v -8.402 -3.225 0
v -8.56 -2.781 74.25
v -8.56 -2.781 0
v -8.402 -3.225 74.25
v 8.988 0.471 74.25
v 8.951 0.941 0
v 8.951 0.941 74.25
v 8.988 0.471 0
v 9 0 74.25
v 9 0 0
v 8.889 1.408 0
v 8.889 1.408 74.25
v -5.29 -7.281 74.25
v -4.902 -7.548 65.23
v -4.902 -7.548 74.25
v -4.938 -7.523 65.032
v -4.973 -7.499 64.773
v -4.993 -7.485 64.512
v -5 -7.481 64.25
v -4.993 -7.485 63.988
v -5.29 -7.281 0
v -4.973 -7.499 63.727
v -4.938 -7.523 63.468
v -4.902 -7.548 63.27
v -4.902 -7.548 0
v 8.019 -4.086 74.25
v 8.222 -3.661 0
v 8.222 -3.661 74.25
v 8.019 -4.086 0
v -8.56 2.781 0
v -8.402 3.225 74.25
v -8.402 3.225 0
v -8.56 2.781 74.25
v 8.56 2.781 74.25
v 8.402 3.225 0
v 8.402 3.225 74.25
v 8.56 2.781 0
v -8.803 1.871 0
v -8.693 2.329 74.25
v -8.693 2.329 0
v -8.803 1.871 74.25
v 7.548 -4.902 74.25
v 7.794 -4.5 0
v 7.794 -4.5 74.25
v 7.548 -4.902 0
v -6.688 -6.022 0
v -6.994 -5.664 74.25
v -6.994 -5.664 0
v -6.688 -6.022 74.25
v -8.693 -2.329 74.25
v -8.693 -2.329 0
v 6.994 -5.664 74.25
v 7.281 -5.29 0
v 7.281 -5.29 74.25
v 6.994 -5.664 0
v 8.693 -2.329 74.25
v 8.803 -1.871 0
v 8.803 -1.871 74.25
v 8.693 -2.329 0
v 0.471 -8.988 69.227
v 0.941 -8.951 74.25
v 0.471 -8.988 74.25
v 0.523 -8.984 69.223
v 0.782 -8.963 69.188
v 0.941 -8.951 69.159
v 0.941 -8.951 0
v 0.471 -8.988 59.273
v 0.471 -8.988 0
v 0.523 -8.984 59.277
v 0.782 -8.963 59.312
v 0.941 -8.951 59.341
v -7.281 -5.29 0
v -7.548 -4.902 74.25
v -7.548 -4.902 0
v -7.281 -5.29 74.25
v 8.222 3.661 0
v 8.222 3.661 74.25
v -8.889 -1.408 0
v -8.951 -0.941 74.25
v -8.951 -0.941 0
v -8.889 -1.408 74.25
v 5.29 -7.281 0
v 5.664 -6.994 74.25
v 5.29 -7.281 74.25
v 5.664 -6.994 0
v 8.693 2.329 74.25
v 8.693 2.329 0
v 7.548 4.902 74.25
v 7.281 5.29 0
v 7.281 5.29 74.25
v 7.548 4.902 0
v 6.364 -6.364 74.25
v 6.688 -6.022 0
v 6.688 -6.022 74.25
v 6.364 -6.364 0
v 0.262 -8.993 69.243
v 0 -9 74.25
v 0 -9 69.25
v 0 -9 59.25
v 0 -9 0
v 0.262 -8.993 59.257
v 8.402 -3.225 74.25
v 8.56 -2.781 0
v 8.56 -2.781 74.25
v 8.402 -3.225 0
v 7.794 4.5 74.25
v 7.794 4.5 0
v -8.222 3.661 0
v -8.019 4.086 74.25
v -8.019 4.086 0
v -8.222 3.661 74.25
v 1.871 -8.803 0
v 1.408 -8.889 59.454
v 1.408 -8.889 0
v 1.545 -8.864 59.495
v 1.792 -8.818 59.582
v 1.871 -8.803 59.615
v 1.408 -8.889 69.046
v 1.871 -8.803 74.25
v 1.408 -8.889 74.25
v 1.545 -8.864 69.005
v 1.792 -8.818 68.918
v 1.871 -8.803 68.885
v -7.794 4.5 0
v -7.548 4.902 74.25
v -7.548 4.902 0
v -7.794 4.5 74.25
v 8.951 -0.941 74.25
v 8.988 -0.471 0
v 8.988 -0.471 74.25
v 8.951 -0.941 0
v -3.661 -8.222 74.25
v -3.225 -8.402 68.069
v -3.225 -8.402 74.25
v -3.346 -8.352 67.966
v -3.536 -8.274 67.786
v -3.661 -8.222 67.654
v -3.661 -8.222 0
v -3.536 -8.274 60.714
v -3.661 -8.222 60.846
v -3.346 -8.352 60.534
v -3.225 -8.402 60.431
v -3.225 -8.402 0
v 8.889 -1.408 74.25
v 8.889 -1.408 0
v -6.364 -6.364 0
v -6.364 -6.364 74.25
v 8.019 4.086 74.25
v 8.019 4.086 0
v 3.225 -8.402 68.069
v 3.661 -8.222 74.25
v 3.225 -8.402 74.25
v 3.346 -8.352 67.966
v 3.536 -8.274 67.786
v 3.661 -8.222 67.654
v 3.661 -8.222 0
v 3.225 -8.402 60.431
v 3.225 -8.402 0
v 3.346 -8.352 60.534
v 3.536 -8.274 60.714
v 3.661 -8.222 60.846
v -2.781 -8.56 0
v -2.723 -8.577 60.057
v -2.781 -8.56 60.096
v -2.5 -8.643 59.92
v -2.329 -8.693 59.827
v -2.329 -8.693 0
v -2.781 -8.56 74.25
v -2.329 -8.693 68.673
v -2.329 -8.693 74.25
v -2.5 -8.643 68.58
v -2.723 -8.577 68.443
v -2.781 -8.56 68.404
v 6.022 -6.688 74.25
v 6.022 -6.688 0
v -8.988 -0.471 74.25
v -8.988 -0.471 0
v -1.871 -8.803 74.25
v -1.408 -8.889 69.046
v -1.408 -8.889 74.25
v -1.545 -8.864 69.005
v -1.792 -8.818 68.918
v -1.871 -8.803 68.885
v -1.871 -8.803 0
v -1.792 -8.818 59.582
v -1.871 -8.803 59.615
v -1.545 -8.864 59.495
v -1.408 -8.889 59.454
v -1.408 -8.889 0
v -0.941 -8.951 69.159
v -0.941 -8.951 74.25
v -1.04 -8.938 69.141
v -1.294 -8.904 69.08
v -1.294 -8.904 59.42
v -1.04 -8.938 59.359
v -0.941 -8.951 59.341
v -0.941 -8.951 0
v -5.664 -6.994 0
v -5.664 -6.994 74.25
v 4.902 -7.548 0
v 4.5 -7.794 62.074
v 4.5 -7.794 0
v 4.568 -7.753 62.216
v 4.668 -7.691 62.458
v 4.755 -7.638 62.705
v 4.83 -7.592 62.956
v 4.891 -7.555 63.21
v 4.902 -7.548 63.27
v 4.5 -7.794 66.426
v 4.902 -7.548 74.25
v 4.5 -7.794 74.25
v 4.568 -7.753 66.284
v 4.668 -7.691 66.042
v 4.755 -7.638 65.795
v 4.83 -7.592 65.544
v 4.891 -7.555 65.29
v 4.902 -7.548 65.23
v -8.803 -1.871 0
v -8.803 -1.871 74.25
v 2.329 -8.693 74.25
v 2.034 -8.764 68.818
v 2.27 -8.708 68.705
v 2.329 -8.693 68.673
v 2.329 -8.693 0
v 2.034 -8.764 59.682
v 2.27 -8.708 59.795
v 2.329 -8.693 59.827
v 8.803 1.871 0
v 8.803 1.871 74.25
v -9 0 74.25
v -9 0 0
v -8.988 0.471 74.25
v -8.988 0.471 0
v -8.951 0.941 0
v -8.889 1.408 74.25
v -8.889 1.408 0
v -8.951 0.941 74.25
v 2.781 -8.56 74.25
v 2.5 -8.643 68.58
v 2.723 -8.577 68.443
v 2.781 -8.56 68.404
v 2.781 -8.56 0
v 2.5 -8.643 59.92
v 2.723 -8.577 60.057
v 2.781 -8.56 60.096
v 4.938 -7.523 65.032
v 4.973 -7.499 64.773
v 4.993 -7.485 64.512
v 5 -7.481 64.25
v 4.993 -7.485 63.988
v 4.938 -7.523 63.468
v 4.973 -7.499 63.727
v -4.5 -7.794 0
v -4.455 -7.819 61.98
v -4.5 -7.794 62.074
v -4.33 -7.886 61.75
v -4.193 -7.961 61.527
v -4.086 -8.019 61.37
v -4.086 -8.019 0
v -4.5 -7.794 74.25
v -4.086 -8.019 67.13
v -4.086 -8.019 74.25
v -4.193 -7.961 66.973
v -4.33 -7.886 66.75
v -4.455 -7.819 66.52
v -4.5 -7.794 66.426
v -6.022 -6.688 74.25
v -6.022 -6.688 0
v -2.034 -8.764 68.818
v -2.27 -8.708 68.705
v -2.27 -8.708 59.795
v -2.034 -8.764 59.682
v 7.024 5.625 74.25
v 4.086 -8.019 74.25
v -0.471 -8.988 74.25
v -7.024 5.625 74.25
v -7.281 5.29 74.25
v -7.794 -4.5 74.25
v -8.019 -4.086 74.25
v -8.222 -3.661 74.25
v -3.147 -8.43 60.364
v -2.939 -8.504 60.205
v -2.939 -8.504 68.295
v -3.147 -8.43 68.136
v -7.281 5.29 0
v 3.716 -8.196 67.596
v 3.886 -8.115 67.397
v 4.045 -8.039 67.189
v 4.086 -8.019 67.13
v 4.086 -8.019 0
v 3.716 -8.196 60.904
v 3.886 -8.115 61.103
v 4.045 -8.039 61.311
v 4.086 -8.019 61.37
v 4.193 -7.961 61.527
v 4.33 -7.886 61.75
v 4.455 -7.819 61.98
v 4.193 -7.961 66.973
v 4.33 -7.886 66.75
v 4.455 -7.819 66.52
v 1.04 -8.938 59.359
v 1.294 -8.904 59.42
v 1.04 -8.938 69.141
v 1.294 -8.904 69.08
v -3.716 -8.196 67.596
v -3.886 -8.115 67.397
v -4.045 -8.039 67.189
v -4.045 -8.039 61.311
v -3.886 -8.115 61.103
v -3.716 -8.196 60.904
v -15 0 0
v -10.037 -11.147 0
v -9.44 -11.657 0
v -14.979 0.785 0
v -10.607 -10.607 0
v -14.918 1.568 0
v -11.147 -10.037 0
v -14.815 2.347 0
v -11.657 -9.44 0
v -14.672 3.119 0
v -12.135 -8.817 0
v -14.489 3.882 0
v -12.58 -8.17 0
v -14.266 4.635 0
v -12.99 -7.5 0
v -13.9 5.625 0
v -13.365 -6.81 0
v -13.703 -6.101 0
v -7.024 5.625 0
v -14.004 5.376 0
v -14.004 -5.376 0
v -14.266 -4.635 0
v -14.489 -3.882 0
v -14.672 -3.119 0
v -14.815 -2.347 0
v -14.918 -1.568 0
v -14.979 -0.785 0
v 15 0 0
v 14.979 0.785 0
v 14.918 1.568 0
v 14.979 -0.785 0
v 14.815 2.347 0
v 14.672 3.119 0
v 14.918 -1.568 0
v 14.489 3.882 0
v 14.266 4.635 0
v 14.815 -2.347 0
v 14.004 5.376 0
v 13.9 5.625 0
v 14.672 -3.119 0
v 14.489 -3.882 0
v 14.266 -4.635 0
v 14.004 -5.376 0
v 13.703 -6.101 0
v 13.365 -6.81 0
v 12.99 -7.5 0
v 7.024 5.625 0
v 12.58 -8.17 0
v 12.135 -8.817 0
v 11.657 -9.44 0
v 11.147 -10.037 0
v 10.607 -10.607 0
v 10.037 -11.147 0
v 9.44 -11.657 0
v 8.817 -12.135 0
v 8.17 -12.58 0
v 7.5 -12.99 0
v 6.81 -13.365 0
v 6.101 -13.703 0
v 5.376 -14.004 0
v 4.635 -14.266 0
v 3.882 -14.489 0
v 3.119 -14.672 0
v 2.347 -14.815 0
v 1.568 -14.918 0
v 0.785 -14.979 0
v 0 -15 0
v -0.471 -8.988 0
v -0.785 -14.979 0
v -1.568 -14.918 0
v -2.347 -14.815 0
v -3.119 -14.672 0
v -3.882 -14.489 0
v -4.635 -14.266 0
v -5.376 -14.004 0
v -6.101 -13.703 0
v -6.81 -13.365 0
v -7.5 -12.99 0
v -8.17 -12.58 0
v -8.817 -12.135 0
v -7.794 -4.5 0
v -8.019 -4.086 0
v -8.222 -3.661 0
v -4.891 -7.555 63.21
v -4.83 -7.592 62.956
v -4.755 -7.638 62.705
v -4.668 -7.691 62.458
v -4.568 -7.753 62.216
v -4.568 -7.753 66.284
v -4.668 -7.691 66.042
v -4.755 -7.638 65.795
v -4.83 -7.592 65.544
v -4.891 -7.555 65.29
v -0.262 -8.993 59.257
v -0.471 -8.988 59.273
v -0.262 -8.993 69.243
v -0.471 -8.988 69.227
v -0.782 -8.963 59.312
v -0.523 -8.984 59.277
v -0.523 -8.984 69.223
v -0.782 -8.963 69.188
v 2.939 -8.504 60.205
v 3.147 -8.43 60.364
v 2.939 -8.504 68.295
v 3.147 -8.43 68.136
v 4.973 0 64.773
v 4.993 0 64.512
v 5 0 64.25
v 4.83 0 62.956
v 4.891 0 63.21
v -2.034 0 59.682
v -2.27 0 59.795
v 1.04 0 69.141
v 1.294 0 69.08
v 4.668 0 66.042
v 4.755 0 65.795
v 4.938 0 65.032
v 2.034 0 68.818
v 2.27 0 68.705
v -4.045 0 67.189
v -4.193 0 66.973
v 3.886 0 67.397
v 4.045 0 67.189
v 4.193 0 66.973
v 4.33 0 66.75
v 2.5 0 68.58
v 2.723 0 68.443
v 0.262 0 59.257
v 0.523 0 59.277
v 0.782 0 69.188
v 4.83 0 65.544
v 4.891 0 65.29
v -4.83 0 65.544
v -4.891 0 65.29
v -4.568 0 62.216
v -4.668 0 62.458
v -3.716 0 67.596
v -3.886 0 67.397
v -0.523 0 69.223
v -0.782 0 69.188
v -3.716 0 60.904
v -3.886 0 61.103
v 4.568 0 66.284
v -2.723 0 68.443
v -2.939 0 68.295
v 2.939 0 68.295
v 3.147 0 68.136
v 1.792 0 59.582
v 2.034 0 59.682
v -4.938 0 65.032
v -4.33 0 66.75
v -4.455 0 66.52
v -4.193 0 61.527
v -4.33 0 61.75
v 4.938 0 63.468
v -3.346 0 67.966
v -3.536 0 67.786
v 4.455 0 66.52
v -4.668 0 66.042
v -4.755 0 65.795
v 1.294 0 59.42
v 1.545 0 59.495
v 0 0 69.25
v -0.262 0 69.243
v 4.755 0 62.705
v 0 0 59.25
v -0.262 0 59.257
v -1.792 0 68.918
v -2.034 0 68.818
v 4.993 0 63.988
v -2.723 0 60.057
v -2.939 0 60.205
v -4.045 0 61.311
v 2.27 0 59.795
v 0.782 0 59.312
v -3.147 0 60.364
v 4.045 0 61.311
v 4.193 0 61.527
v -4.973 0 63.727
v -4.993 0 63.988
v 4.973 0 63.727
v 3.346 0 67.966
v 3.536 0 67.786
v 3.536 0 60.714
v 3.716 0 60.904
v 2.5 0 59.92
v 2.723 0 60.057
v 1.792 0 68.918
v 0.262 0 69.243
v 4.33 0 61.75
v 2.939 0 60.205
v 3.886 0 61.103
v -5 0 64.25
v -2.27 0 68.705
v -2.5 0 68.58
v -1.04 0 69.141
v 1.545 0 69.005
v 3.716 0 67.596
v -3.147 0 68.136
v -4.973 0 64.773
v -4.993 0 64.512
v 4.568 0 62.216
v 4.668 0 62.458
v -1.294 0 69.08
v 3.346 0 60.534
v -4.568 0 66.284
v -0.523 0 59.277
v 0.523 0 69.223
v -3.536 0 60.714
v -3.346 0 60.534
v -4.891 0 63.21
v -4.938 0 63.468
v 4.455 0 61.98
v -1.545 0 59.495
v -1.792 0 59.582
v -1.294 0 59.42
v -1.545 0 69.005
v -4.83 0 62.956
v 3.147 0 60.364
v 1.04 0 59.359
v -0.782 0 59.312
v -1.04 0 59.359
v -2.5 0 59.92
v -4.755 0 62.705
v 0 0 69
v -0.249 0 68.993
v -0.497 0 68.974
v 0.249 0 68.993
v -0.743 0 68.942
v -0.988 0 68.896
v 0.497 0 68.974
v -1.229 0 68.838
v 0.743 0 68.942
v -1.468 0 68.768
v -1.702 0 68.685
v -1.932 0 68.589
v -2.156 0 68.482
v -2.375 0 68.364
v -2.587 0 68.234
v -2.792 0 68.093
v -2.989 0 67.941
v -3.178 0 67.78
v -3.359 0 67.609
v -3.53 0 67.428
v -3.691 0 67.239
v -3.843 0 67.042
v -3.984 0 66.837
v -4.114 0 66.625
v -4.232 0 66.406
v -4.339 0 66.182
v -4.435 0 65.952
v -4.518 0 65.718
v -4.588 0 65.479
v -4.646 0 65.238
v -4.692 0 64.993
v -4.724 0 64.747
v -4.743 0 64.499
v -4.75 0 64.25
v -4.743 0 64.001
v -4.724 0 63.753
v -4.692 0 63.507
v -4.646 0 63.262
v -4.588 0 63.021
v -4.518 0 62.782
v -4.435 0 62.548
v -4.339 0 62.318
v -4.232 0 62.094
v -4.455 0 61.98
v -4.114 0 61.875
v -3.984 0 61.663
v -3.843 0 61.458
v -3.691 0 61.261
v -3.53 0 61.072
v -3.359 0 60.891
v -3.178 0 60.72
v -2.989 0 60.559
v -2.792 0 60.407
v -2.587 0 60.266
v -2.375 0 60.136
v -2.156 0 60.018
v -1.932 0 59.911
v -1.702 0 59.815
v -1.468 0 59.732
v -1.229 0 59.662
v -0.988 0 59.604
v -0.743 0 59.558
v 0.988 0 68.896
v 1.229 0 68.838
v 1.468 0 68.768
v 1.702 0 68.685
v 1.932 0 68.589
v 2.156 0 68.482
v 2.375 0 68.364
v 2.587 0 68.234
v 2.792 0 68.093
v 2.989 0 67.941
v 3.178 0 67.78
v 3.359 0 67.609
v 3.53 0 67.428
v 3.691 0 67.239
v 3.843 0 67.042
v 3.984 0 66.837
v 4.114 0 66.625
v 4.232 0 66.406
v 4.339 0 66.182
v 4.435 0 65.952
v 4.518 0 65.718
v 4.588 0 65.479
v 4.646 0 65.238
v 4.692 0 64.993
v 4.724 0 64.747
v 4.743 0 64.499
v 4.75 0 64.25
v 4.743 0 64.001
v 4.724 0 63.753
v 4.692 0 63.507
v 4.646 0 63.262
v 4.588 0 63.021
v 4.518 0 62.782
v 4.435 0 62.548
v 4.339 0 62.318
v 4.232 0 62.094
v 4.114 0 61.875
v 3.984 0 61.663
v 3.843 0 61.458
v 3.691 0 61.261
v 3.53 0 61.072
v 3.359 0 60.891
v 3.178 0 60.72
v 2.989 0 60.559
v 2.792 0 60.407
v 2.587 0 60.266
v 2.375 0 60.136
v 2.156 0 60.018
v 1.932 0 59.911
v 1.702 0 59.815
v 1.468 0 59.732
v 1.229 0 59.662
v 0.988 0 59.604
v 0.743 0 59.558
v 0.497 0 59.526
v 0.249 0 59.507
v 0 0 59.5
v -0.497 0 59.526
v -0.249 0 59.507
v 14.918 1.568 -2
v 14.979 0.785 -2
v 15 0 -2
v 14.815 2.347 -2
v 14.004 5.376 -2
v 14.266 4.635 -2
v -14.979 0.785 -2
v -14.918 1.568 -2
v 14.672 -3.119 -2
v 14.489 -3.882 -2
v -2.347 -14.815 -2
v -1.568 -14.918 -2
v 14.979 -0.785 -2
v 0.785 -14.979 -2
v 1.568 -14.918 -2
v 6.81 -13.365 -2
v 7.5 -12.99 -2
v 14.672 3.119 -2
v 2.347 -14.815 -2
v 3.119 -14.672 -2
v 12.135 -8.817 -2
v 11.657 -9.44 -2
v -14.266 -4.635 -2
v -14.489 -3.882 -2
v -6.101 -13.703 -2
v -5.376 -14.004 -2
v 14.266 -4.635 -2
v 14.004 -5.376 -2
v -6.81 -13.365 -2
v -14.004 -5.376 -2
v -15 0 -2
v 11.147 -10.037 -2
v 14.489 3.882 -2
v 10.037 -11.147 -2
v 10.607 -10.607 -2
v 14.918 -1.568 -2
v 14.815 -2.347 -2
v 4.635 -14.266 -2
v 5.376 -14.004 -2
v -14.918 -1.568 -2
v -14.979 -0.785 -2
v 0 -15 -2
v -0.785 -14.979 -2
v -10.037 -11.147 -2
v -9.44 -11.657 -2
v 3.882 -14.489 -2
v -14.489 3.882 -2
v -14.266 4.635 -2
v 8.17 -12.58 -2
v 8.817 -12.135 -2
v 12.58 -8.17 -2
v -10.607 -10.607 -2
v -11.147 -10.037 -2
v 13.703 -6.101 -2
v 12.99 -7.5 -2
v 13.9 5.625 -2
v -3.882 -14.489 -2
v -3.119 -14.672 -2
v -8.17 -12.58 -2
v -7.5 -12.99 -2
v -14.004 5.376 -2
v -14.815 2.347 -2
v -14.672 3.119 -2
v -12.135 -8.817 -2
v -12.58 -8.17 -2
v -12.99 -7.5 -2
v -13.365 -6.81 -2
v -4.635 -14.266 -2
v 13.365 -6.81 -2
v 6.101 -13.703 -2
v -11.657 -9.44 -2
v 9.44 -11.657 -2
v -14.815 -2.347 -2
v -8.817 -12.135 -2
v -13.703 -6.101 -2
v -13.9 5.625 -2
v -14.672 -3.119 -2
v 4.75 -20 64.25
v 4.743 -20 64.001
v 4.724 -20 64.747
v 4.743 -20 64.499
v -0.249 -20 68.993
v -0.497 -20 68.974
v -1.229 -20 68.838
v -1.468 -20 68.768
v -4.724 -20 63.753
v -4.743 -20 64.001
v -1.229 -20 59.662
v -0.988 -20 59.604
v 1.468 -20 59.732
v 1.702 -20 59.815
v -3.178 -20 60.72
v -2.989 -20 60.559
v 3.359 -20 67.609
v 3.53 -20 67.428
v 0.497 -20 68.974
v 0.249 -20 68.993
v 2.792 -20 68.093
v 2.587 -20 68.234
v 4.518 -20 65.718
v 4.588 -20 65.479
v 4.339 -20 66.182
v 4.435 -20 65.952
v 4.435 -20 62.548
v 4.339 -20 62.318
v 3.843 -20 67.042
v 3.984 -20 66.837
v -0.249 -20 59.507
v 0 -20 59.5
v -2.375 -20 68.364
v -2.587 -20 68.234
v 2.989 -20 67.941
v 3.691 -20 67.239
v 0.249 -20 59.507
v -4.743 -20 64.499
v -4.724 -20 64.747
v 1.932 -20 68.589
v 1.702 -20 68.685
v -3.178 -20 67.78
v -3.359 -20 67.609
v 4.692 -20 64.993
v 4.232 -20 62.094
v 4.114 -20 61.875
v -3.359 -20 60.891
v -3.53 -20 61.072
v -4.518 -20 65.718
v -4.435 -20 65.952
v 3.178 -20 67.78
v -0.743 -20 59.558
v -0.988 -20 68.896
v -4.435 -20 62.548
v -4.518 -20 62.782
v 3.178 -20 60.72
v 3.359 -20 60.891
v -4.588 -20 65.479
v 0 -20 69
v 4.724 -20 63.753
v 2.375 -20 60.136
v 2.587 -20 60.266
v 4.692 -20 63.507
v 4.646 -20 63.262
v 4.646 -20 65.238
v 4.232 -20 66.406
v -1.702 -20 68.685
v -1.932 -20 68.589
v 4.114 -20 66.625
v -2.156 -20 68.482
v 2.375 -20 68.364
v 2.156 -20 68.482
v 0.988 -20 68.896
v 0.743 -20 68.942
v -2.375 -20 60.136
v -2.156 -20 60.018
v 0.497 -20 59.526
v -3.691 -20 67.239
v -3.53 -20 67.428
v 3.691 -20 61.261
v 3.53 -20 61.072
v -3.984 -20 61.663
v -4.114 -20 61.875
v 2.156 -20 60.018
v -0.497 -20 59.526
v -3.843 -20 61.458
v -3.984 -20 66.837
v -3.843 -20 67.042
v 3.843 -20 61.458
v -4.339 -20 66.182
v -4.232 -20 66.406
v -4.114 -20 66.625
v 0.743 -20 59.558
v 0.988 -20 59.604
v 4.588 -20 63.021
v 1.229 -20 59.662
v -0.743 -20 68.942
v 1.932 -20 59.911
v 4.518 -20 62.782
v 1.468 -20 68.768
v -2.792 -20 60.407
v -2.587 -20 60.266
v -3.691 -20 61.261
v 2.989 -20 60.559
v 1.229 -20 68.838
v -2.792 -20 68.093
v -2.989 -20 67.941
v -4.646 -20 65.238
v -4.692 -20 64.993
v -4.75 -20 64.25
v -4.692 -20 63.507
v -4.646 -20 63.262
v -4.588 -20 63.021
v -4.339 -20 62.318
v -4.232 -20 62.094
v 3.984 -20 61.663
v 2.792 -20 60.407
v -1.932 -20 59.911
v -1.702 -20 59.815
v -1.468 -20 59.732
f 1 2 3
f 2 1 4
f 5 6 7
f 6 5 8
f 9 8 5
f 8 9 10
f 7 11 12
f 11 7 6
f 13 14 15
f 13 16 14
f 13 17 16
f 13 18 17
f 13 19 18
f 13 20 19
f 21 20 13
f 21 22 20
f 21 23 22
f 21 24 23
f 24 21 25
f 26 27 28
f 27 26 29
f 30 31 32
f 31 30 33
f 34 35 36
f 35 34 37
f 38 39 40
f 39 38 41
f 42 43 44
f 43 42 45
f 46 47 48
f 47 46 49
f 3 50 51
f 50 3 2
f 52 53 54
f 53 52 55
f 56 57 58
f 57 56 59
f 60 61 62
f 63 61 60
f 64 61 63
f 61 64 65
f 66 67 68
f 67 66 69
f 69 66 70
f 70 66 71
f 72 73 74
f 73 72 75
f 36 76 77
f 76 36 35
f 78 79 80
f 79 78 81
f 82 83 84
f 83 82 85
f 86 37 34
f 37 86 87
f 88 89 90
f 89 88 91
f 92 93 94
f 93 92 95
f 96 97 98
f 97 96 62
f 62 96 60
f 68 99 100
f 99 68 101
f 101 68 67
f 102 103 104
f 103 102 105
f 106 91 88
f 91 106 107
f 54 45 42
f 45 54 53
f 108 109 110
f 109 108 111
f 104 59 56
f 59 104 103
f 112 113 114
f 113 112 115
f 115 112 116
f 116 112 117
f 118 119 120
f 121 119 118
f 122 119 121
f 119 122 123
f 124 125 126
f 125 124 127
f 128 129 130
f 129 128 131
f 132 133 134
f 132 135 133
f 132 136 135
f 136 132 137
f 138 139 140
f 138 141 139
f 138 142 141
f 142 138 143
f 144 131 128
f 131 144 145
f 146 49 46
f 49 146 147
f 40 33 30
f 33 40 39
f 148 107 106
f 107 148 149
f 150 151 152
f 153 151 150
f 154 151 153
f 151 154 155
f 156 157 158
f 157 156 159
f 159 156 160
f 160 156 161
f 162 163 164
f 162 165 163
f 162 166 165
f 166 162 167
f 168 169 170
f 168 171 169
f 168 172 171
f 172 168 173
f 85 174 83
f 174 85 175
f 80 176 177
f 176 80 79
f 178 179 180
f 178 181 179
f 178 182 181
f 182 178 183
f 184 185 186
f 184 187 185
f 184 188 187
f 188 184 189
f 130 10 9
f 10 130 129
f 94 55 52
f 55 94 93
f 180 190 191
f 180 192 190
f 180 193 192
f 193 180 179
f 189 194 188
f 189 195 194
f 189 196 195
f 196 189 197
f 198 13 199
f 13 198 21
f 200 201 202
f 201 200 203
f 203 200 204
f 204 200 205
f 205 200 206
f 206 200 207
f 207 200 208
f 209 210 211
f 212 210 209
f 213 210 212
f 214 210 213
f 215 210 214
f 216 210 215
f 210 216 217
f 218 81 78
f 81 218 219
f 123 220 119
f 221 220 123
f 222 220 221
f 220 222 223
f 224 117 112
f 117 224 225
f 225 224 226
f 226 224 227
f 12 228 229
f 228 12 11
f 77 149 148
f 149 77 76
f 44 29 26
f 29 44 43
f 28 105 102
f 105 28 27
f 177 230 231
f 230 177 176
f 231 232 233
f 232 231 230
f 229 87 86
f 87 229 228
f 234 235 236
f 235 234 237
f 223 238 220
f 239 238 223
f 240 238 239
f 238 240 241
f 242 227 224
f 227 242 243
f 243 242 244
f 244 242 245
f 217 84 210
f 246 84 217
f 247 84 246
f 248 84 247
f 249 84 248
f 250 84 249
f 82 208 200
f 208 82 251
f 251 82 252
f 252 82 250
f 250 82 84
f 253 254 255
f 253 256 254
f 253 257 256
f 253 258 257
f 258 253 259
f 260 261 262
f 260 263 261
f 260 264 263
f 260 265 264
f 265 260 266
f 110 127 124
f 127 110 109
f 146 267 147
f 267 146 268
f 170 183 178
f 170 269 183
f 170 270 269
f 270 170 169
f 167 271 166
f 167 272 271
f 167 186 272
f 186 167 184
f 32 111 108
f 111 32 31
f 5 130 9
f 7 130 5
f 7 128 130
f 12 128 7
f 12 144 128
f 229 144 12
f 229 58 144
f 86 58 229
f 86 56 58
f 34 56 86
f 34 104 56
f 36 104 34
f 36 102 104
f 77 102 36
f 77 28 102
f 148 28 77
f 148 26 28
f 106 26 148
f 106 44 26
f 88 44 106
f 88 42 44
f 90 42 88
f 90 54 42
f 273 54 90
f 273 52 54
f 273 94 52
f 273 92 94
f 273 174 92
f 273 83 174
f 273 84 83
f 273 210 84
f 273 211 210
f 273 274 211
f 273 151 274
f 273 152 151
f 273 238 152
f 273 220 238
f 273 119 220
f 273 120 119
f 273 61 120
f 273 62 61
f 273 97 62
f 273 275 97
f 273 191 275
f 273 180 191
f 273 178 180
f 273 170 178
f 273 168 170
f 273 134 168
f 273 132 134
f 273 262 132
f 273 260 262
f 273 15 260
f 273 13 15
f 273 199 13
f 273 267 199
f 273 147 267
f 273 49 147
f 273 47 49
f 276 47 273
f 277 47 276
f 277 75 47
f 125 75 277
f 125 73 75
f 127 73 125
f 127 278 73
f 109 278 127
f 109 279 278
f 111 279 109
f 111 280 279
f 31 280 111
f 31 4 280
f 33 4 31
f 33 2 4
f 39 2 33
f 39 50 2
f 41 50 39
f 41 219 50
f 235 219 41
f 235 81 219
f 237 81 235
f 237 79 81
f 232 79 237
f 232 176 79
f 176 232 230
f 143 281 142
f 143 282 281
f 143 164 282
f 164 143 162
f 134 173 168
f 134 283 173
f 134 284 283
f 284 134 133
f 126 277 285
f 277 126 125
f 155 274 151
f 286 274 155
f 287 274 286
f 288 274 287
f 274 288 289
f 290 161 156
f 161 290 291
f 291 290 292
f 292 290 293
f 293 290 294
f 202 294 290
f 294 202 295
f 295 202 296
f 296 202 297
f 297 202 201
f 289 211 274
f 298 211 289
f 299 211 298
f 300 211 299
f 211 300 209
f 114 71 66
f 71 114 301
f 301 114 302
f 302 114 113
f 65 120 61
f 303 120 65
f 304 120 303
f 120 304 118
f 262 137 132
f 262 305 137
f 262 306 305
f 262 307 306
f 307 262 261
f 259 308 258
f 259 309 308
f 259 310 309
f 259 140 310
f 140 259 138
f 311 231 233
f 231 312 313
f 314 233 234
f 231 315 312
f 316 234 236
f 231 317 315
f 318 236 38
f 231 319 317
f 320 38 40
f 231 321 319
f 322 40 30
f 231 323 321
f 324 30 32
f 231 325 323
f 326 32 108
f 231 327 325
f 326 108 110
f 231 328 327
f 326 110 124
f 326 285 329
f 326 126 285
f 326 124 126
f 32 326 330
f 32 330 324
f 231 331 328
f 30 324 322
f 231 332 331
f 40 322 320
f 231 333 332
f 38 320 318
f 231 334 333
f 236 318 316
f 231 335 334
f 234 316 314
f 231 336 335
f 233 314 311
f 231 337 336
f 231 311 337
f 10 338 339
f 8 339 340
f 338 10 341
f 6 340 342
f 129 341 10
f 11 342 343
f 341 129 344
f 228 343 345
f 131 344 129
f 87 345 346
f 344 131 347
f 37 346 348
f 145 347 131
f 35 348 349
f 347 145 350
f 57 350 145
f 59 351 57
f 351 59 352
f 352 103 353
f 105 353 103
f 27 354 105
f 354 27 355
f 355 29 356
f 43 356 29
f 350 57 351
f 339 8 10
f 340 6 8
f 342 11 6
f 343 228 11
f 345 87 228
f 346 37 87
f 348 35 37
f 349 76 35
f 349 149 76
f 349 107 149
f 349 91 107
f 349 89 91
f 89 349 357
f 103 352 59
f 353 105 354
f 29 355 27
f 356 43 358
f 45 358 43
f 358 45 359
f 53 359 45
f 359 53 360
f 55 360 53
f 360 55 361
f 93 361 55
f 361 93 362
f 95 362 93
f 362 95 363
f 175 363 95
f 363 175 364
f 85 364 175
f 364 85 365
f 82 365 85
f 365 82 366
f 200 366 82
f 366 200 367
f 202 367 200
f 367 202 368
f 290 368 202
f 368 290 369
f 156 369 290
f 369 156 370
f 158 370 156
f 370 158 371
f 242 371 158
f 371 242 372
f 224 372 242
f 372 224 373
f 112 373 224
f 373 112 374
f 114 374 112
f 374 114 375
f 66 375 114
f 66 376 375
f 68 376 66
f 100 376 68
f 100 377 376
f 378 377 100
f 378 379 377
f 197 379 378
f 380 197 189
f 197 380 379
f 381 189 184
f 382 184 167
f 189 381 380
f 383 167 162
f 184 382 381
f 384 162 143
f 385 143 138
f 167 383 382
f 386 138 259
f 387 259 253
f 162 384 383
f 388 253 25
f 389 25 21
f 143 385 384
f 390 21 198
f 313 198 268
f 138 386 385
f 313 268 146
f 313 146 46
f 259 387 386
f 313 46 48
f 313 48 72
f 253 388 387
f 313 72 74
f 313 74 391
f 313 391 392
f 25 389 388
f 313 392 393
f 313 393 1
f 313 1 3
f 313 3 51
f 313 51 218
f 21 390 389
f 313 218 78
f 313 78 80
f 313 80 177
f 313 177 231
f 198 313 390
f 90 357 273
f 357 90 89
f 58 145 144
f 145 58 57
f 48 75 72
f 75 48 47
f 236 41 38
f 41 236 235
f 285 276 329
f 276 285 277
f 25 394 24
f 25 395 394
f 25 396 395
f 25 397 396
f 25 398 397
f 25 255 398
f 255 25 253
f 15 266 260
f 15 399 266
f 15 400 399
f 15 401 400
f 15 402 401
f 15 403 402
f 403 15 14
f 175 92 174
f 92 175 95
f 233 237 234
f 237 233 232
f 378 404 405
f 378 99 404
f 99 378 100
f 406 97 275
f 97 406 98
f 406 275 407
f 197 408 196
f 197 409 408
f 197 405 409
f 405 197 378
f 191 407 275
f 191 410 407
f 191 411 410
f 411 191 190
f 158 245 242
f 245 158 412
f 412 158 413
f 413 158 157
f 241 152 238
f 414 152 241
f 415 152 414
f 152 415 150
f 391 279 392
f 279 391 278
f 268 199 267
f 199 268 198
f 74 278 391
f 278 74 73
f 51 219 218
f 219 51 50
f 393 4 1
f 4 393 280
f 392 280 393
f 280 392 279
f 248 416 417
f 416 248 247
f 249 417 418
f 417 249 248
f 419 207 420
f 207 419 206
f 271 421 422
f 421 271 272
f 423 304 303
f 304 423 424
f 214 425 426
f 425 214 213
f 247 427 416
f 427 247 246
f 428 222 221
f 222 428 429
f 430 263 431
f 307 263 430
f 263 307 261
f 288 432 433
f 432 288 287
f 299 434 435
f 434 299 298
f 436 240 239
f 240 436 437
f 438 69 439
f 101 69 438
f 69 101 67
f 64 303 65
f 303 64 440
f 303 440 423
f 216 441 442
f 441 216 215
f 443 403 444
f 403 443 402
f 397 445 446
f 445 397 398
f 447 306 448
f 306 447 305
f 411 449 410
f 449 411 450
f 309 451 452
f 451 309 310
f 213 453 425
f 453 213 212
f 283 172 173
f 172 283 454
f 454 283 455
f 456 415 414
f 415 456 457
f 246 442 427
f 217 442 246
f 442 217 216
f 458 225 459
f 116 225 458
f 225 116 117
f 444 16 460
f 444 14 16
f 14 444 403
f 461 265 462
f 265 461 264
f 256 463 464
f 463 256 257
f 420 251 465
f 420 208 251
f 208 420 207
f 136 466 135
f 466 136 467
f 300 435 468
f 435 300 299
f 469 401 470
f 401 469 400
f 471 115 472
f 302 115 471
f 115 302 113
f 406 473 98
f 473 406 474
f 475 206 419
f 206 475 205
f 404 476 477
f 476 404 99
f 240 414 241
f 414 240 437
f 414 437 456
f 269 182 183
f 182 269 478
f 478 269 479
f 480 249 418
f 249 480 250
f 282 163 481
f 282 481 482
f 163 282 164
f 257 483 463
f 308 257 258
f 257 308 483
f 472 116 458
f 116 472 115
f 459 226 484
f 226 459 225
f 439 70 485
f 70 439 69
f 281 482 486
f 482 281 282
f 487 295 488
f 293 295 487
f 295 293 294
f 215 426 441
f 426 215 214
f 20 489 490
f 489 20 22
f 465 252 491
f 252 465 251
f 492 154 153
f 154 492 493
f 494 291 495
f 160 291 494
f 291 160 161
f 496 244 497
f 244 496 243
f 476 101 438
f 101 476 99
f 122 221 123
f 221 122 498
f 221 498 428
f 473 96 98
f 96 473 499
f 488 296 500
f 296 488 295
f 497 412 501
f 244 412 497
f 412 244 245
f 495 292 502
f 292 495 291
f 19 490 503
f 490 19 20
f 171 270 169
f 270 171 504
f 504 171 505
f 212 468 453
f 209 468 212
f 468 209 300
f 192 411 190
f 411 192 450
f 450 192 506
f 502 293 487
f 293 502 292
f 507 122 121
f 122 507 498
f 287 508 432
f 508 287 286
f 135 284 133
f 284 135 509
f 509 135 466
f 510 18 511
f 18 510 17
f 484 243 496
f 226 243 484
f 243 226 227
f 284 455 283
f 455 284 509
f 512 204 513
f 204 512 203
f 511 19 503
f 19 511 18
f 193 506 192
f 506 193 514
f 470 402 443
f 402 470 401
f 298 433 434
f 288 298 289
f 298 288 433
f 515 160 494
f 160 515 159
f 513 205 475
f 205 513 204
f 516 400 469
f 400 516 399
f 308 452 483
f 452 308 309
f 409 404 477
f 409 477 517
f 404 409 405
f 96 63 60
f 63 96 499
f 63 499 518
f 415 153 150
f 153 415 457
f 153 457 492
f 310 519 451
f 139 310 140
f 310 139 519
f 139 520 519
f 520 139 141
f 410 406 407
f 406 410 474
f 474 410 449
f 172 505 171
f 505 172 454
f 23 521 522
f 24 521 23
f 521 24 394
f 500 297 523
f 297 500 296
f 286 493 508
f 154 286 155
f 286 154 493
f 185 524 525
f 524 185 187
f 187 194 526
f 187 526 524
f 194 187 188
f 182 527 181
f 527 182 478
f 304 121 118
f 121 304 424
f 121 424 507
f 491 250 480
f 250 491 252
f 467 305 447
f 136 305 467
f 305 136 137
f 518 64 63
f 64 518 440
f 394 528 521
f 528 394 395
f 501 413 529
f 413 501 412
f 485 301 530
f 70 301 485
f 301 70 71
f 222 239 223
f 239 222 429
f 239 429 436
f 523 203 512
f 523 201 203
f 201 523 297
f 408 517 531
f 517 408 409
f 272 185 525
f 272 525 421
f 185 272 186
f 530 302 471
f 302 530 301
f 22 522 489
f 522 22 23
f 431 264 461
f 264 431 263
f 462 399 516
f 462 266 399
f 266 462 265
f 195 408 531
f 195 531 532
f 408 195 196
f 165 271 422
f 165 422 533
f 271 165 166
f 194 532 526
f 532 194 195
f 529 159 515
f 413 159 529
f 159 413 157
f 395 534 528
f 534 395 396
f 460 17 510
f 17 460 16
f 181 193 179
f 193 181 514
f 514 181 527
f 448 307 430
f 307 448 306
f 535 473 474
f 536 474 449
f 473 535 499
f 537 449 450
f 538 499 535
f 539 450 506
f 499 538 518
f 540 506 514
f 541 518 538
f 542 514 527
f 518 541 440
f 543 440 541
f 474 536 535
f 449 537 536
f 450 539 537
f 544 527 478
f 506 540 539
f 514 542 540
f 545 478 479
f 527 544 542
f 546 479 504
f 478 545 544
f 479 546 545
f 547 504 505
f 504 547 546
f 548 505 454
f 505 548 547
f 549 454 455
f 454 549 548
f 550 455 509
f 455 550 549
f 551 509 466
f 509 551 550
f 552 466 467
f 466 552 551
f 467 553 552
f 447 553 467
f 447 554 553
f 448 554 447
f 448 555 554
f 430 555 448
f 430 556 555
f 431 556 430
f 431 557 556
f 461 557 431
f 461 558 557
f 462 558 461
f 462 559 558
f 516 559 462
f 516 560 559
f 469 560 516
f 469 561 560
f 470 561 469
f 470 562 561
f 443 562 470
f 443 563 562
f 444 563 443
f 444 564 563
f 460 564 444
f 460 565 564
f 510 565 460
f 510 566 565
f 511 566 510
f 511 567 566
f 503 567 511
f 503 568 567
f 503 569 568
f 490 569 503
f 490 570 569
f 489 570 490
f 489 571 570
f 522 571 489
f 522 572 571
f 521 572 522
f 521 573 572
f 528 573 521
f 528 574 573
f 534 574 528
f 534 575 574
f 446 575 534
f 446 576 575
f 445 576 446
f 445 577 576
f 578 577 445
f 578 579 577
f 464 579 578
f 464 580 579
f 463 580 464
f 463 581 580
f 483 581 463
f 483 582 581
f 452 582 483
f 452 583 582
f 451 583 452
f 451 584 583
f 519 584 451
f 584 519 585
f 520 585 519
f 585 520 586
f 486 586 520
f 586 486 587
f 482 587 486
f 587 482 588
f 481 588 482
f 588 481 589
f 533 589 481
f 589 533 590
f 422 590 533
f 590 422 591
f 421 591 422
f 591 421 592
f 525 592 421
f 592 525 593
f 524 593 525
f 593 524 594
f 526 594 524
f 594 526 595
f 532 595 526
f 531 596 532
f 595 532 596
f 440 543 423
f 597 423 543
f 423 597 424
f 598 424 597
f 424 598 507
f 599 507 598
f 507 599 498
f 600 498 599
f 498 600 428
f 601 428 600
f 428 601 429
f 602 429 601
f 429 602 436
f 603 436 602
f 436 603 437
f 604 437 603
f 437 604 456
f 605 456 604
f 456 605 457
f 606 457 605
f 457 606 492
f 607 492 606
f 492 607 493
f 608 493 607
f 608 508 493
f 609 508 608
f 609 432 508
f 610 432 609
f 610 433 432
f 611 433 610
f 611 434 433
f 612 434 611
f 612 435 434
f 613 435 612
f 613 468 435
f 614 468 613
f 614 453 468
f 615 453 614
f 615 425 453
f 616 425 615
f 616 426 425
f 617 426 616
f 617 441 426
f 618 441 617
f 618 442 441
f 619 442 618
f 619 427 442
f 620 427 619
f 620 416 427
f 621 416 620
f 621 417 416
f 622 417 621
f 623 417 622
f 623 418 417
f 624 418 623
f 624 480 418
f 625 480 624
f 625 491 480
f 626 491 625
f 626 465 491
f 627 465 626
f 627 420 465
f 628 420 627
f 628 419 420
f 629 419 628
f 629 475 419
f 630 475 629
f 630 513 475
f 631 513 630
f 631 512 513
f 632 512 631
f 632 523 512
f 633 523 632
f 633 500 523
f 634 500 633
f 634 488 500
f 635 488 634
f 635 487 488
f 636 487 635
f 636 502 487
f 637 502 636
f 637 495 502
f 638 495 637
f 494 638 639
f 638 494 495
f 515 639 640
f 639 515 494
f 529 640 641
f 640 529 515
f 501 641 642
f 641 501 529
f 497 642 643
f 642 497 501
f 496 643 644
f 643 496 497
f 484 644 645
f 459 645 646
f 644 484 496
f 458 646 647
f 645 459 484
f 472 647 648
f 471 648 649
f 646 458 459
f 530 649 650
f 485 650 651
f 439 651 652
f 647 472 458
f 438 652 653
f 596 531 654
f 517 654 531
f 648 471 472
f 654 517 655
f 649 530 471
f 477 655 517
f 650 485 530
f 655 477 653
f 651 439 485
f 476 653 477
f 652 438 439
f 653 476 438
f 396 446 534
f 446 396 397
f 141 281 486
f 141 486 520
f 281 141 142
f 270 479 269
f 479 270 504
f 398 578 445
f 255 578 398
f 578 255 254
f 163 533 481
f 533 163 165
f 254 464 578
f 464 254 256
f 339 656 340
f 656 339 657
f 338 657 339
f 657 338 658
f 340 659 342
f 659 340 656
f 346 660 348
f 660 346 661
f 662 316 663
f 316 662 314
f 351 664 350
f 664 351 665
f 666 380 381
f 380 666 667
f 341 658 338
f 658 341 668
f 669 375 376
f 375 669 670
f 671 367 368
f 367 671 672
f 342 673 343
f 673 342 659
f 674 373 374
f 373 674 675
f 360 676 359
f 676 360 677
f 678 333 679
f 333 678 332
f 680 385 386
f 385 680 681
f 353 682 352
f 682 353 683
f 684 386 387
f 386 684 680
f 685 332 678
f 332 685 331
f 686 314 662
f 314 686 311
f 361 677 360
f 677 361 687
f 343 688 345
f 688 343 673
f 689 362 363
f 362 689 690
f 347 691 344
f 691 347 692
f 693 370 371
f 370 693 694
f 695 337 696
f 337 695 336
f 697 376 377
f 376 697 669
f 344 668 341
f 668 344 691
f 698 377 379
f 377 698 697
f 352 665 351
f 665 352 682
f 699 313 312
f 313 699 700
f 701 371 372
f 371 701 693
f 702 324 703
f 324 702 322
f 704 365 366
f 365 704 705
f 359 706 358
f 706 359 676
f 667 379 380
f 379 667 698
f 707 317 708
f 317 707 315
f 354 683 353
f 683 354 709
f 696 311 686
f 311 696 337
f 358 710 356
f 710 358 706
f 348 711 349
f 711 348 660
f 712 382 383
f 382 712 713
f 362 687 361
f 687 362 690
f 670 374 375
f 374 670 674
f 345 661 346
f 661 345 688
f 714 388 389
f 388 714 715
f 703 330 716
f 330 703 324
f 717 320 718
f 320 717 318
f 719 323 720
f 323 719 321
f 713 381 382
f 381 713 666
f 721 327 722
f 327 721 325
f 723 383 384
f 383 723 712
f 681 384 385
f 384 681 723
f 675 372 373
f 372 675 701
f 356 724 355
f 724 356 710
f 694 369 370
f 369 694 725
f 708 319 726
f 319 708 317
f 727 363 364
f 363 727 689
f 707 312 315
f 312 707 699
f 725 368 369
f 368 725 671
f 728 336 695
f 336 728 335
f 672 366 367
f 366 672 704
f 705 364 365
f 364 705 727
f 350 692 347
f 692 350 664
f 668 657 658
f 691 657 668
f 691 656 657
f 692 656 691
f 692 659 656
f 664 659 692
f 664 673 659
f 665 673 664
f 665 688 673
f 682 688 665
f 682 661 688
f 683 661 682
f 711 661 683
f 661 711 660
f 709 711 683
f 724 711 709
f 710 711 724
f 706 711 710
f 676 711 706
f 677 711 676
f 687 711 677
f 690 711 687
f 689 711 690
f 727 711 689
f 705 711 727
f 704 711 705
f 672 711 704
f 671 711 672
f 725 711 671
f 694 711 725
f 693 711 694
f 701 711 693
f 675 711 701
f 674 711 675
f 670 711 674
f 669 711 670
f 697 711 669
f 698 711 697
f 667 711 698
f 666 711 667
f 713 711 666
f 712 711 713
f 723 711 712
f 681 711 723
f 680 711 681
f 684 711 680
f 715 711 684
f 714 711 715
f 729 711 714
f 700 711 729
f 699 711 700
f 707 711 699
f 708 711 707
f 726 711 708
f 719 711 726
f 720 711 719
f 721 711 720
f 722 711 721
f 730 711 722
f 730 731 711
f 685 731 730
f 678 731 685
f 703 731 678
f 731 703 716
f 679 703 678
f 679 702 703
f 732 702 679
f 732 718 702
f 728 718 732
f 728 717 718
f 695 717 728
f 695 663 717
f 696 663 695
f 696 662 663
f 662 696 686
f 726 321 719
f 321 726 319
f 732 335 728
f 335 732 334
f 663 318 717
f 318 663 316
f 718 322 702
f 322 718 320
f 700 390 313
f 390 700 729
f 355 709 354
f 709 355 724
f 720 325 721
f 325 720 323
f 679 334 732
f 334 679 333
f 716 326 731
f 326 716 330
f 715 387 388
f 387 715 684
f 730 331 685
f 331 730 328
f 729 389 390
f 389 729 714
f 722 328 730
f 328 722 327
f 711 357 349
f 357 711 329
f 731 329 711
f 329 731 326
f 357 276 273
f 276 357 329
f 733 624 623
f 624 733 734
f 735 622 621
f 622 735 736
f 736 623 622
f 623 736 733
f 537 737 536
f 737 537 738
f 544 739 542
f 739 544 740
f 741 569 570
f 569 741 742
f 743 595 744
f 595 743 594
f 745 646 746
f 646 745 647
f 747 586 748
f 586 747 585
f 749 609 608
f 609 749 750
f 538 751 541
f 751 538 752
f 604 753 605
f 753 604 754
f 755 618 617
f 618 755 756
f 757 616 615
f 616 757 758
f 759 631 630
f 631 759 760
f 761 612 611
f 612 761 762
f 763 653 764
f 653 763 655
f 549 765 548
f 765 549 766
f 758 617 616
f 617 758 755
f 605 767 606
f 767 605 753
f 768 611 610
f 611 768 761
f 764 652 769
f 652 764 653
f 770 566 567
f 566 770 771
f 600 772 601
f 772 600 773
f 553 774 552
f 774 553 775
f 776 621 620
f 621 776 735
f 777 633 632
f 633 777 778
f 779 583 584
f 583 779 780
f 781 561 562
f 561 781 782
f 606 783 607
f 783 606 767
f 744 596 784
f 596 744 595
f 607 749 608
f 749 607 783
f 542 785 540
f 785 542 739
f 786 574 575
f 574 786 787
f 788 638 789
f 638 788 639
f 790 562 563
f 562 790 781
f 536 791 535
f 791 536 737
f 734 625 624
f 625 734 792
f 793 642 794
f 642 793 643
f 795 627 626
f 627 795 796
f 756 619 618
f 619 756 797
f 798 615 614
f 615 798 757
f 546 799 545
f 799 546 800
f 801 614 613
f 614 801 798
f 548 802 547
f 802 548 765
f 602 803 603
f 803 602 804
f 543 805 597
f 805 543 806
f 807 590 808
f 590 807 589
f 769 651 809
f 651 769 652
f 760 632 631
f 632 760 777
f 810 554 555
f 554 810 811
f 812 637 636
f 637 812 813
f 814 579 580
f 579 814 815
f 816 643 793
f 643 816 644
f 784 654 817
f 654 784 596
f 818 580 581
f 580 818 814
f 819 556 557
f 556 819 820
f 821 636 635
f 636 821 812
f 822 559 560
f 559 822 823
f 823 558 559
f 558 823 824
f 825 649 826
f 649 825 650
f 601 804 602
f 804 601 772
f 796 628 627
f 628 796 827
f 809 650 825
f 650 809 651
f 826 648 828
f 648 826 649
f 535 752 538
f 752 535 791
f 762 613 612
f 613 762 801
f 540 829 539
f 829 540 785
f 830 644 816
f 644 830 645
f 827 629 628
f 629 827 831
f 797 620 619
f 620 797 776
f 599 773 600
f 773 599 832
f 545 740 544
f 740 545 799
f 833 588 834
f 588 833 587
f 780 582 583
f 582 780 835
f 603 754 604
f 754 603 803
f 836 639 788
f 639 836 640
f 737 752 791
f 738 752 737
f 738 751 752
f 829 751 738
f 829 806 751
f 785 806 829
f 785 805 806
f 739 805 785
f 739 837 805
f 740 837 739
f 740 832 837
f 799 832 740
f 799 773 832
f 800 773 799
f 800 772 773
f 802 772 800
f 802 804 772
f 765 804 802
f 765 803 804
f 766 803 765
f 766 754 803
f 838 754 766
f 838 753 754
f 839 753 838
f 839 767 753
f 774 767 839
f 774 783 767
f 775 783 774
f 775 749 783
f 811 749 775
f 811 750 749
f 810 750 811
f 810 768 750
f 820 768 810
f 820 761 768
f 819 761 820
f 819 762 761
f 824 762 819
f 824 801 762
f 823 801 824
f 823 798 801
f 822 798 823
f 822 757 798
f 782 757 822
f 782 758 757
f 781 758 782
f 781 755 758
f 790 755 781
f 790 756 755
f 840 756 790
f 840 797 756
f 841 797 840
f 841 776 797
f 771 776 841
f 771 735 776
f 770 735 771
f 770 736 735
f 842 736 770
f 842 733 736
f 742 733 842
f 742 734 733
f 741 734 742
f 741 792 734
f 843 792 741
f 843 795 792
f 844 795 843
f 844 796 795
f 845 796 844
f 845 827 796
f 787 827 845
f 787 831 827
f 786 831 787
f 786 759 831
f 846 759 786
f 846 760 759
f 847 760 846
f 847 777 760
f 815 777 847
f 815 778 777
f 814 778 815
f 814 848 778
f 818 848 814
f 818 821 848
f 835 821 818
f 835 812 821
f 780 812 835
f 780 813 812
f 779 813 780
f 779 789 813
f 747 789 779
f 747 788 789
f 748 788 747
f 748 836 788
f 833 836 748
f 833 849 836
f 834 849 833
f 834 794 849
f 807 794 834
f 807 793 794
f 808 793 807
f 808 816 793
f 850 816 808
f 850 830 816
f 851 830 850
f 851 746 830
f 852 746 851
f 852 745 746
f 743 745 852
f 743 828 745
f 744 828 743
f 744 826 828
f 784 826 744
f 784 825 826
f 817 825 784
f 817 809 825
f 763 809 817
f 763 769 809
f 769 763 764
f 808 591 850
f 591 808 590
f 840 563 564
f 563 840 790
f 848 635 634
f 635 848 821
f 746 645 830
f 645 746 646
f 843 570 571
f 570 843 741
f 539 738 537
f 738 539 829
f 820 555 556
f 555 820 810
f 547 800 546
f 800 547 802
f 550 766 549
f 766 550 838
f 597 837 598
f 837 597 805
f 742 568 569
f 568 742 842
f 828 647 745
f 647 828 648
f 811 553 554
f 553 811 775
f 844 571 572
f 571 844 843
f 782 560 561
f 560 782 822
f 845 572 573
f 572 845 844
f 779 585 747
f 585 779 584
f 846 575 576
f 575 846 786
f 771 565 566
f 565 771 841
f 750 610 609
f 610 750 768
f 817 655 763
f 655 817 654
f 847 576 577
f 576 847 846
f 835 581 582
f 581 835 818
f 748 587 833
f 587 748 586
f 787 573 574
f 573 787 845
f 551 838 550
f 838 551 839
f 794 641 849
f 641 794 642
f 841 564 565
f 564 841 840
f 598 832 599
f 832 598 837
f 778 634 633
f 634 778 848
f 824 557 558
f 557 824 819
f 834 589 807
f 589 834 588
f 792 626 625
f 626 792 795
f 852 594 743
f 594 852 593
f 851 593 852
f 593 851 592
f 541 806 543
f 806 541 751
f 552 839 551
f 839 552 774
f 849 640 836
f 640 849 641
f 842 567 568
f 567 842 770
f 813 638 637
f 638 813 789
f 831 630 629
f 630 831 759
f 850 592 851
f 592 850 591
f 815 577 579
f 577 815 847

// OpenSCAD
hole_dia=18.75;
wall_thickness=16.5;
plate_thickness=2;
plate_dia=30;

$fn=120;

module wall() {
    difference() {
        translate([-100,-100,0]) color("brown") cube([200,200,wall_thickness]);
        translate([0,0,-1]) cylinder(d=18,h=wall_thickness+2);
    }
}

//wall();

module main() {
    translate([0,0,-plate_thickness]) cylinder(d=plate_dia,h=plate_thickness);
    difference() {
        cylinder(d=18,h=wall_thickness*4.5);
        translate([0,0,wall_thickness*4.5 - 10]) rotate([90,0,0]) cylinder(d=10,h=20);
    }
}

module peg() {
    translate([0,0,wall_thickness*4.5 - 10]) rotate([90,0,0]) cylinder(d=10-0.5,h=20);
}

difference() {
    main();
    translate([-20,(plate_dia-hole_dia)/2,-30]) cube([40,20,wall_thickness*10]);
}
peg();
